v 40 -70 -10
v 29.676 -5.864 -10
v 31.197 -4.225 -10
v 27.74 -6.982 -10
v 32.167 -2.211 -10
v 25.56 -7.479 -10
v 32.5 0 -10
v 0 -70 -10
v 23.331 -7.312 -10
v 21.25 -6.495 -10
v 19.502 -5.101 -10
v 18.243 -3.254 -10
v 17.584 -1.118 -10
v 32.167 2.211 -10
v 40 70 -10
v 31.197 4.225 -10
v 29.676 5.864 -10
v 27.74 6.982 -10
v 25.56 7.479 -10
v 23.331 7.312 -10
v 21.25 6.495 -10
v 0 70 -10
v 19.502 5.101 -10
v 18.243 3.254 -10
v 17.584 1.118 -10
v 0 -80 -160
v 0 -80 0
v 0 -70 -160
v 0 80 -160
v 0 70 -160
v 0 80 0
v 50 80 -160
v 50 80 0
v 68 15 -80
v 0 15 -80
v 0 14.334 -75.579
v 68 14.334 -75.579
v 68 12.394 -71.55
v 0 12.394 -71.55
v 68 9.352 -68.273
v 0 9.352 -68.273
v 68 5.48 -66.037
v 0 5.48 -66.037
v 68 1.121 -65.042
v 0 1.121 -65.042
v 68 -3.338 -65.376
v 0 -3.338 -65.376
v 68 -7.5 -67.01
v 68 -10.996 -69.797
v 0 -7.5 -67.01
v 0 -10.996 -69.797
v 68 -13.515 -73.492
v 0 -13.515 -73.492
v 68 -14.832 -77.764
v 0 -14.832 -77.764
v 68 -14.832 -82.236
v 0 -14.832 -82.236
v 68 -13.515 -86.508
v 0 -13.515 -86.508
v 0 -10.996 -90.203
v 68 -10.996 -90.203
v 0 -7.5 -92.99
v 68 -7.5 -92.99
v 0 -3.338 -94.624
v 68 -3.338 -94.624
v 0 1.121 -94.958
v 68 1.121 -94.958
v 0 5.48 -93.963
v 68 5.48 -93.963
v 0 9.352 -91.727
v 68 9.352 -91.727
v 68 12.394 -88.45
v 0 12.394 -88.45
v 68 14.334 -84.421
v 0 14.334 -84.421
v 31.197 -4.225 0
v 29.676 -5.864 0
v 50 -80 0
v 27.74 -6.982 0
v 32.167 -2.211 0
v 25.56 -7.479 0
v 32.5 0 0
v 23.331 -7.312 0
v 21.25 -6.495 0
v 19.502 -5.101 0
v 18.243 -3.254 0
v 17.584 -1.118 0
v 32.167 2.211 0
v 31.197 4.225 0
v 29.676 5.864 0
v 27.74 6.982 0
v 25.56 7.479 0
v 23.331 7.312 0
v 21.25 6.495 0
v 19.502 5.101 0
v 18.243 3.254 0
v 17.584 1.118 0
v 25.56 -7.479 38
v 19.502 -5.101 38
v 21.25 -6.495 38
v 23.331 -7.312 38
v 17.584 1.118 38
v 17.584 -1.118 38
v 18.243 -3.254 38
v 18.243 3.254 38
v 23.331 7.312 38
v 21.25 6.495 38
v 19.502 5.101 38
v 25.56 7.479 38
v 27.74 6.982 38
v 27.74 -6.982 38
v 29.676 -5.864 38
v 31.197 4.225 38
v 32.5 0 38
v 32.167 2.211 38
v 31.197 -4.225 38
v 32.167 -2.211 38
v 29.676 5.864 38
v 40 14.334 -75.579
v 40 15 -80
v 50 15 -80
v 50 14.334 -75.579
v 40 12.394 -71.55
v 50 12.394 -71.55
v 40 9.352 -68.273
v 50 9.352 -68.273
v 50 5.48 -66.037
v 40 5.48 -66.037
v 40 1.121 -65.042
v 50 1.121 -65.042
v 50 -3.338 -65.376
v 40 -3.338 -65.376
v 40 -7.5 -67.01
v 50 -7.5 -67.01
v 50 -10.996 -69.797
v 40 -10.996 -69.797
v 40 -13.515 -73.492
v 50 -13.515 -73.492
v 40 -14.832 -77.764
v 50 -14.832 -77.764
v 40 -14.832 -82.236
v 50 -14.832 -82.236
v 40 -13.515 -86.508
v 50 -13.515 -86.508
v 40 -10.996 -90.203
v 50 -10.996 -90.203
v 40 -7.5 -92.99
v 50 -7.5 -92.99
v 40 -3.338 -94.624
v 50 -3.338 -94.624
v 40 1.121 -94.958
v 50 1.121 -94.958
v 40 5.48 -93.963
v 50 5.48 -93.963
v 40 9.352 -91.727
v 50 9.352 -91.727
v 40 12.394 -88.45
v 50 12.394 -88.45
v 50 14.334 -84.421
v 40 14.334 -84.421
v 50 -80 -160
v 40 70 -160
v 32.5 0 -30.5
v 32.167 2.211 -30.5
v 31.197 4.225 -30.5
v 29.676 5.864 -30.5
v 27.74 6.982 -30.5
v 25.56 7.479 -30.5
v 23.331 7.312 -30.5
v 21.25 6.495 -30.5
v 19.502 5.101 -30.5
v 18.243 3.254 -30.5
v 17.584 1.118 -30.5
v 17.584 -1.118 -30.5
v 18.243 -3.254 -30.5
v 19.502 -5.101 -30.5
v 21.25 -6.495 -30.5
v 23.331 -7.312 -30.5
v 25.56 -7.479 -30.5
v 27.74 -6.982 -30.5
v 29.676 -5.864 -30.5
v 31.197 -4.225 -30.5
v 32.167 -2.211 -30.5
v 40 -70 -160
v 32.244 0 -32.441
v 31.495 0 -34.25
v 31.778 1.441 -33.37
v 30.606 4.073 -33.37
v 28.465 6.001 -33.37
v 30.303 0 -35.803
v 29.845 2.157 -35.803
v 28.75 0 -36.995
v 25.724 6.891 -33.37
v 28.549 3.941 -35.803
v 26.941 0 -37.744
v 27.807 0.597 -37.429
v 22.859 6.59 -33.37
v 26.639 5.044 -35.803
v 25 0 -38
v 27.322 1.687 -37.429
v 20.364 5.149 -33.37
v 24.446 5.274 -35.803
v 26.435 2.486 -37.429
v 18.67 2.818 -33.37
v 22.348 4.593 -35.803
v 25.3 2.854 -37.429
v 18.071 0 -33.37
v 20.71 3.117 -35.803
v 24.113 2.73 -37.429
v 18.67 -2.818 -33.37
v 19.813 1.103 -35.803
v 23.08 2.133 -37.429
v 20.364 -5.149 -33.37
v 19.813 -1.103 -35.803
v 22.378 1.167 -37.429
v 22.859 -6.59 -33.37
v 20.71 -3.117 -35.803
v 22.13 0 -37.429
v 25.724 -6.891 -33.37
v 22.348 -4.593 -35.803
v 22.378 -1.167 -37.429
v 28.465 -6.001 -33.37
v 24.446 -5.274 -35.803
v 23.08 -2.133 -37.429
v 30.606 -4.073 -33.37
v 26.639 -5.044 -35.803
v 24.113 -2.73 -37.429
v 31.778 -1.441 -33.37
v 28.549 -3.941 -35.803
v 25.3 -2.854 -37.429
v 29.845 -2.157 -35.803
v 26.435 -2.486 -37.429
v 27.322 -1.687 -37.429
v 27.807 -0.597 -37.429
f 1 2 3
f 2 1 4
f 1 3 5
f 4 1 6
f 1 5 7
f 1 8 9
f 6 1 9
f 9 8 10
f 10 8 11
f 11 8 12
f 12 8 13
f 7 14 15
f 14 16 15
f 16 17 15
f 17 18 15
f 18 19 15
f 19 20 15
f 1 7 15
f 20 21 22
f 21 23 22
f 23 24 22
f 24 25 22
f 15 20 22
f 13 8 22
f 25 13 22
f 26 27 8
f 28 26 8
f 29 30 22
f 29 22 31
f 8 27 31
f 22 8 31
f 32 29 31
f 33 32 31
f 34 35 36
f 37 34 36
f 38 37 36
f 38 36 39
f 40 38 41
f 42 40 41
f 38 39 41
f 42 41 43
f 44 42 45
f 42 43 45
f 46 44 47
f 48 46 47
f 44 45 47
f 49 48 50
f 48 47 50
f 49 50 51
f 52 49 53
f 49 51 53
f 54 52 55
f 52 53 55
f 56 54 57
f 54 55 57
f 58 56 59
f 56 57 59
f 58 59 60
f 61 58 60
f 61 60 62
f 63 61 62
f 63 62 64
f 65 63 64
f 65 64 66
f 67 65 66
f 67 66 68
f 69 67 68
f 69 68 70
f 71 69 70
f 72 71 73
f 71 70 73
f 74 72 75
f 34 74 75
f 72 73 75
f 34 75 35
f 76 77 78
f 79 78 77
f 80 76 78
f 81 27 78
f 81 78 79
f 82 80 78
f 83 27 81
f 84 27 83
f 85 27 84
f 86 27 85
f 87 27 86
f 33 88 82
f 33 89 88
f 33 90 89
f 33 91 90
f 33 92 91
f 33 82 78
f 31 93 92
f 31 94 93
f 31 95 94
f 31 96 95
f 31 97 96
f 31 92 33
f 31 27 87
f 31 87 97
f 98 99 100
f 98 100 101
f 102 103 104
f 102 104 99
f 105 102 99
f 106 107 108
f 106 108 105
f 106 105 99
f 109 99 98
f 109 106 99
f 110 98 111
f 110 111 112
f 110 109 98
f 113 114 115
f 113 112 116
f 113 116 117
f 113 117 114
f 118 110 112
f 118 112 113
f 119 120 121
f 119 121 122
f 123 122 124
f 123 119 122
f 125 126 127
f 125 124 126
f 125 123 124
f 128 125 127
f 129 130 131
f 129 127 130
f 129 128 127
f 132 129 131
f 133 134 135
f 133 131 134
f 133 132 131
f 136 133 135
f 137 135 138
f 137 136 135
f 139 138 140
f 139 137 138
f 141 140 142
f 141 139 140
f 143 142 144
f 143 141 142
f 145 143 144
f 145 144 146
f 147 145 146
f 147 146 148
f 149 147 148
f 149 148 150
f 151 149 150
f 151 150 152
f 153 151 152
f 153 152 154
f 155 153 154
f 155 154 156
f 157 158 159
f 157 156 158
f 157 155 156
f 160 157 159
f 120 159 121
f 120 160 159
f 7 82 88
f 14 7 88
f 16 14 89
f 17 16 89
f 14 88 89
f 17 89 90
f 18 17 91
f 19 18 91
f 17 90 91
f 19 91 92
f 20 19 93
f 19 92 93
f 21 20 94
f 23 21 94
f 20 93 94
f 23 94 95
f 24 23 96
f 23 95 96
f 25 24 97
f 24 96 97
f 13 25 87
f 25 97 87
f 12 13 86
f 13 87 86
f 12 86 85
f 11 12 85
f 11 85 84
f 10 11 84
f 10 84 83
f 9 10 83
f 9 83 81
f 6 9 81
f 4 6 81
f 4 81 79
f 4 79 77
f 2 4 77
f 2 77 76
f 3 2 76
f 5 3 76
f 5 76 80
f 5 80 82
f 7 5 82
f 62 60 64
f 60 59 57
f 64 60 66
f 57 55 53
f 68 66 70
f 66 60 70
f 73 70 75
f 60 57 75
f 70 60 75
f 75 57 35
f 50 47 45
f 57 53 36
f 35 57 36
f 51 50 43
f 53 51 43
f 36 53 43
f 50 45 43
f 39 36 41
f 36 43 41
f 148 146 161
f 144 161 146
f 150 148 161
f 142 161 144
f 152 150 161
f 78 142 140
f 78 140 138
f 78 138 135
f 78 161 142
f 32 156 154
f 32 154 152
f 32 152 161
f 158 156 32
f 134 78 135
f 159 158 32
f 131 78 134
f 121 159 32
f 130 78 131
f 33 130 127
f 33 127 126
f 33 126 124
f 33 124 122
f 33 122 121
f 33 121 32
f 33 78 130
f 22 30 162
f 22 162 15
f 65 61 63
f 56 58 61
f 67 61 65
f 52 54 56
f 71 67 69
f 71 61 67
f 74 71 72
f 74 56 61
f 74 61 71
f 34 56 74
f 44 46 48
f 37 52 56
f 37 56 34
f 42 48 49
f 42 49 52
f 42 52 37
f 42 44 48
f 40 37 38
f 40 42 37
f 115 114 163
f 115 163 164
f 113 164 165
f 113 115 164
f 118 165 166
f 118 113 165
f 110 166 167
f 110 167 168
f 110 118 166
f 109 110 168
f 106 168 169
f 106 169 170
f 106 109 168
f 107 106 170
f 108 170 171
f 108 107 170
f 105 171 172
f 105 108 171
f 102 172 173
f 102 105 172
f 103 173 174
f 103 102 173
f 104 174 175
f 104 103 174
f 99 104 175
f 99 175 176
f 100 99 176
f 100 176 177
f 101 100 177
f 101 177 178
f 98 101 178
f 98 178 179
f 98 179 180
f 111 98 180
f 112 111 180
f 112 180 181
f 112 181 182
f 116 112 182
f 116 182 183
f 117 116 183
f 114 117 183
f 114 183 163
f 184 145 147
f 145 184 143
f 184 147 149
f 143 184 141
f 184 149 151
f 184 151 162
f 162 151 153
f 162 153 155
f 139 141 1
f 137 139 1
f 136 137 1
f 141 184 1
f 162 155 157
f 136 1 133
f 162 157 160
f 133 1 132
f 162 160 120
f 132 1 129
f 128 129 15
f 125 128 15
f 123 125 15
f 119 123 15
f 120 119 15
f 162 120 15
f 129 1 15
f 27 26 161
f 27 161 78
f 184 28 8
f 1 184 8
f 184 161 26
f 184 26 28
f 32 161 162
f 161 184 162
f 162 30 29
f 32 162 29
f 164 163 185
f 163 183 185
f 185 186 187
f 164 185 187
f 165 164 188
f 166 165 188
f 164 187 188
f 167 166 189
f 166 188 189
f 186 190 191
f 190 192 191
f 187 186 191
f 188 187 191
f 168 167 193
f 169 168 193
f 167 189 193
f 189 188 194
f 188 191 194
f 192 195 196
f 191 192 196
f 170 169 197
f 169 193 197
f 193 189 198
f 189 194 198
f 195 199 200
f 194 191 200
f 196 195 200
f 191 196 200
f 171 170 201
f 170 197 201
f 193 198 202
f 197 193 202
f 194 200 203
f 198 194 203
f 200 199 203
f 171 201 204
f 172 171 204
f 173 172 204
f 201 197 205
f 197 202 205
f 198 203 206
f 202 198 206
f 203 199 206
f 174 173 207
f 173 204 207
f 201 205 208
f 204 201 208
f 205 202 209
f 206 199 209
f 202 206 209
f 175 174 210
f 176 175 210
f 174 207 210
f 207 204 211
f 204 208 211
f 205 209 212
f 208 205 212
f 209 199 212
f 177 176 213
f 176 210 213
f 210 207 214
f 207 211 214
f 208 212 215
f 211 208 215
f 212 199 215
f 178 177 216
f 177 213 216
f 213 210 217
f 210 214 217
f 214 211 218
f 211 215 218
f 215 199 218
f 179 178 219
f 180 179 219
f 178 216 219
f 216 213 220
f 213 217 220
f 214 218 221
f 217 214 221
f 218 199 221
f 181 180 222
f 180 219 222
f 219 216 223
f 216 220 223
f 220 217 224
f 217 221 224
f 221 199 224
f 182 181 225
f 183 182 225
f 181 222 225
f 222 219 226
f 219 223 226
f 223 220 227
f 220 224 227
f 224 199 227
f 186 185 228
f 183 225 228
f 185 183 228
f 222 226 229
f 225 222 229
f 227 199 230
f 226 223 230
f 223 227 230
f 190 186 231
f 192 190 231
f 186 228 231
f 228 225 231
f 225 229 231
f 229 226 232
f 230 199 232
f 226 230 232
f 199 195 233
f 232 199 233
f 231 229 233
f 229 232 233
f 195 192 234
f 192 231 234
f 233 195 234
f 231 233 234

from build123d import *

# Parameters (mm, degrees)
F0_W     = 160
F0_H     = 160
F0_R     = 15
F1_DEPTH = 50
F2_T     = -10
F3_DEPTH = 65
F4_R     = 7.5
F5_DEPTH = 35
F6_DEPTH = 38
F7_R     = 7.5
F8_DEPTH = 68


with BuildPart() as f1:
    # F0 (on Right) → F1 (new body)
    with BuildSketch(Plane.YZ):
        with Locations((0, -80)):
            Rectangle(F0_W, F0_H)
        with Locations((0, -80)):
            Circle(F0_R, mode=Mode.SUBTRACT)
        with Locations((0, -80)):
            Circle(F0_R)
    extrude(amount=F1_DEPTH)

    # F2
    f2_openings = [f1.faces().sort_by_distance(p)[0] for p in [
        (25, 0, -160),
        (0, 0, -80),
    ]]
    offset(amount=F2_T, openings=f2_openings)

    # F0 (on Right) → F3 (cut)
    with BuildSketch(Plane.YZ):
        with Locations((0, -80)):
            Circle(F0_R)
    extrude(amount=F3_DEPTH, mode=Mode.SUBTRACT)

    # F4 (on face) → F5 (cut)
    with BuildSketch(Plane.XY):
        with Locations((25, 0)):
            Circle(F4_R)
    extrude(amount=-F5_DEPTH, mode=Mode.SUBTRACT)


with BuildPart() as f6:
    # F4 (on face) → F6 (new body, symmetric)
    with BuildSketch(Plane.XY):
        with Locations((25, 0)):
            Circle(F4_R)
    extrude(amount=F6_DEPTH, both=True)

    # F7
    f7_edges = [f6.edges().sort_by_distance(p)[0] for p in [
        (17.5, 0, -38),
    ]]
    fillet(f7_edges, radius=F7_R)


with BuildPart() as f8:
    # F0 (on Right) → F8 (new body)
    with BuildSketch(Plane.YZ):
        with Locations((0, -80)):
            Circle(F0_R)
    extrude(amount=F8_DEPTH)


solid = Compound([f1.part, f6.part, f8.part])
